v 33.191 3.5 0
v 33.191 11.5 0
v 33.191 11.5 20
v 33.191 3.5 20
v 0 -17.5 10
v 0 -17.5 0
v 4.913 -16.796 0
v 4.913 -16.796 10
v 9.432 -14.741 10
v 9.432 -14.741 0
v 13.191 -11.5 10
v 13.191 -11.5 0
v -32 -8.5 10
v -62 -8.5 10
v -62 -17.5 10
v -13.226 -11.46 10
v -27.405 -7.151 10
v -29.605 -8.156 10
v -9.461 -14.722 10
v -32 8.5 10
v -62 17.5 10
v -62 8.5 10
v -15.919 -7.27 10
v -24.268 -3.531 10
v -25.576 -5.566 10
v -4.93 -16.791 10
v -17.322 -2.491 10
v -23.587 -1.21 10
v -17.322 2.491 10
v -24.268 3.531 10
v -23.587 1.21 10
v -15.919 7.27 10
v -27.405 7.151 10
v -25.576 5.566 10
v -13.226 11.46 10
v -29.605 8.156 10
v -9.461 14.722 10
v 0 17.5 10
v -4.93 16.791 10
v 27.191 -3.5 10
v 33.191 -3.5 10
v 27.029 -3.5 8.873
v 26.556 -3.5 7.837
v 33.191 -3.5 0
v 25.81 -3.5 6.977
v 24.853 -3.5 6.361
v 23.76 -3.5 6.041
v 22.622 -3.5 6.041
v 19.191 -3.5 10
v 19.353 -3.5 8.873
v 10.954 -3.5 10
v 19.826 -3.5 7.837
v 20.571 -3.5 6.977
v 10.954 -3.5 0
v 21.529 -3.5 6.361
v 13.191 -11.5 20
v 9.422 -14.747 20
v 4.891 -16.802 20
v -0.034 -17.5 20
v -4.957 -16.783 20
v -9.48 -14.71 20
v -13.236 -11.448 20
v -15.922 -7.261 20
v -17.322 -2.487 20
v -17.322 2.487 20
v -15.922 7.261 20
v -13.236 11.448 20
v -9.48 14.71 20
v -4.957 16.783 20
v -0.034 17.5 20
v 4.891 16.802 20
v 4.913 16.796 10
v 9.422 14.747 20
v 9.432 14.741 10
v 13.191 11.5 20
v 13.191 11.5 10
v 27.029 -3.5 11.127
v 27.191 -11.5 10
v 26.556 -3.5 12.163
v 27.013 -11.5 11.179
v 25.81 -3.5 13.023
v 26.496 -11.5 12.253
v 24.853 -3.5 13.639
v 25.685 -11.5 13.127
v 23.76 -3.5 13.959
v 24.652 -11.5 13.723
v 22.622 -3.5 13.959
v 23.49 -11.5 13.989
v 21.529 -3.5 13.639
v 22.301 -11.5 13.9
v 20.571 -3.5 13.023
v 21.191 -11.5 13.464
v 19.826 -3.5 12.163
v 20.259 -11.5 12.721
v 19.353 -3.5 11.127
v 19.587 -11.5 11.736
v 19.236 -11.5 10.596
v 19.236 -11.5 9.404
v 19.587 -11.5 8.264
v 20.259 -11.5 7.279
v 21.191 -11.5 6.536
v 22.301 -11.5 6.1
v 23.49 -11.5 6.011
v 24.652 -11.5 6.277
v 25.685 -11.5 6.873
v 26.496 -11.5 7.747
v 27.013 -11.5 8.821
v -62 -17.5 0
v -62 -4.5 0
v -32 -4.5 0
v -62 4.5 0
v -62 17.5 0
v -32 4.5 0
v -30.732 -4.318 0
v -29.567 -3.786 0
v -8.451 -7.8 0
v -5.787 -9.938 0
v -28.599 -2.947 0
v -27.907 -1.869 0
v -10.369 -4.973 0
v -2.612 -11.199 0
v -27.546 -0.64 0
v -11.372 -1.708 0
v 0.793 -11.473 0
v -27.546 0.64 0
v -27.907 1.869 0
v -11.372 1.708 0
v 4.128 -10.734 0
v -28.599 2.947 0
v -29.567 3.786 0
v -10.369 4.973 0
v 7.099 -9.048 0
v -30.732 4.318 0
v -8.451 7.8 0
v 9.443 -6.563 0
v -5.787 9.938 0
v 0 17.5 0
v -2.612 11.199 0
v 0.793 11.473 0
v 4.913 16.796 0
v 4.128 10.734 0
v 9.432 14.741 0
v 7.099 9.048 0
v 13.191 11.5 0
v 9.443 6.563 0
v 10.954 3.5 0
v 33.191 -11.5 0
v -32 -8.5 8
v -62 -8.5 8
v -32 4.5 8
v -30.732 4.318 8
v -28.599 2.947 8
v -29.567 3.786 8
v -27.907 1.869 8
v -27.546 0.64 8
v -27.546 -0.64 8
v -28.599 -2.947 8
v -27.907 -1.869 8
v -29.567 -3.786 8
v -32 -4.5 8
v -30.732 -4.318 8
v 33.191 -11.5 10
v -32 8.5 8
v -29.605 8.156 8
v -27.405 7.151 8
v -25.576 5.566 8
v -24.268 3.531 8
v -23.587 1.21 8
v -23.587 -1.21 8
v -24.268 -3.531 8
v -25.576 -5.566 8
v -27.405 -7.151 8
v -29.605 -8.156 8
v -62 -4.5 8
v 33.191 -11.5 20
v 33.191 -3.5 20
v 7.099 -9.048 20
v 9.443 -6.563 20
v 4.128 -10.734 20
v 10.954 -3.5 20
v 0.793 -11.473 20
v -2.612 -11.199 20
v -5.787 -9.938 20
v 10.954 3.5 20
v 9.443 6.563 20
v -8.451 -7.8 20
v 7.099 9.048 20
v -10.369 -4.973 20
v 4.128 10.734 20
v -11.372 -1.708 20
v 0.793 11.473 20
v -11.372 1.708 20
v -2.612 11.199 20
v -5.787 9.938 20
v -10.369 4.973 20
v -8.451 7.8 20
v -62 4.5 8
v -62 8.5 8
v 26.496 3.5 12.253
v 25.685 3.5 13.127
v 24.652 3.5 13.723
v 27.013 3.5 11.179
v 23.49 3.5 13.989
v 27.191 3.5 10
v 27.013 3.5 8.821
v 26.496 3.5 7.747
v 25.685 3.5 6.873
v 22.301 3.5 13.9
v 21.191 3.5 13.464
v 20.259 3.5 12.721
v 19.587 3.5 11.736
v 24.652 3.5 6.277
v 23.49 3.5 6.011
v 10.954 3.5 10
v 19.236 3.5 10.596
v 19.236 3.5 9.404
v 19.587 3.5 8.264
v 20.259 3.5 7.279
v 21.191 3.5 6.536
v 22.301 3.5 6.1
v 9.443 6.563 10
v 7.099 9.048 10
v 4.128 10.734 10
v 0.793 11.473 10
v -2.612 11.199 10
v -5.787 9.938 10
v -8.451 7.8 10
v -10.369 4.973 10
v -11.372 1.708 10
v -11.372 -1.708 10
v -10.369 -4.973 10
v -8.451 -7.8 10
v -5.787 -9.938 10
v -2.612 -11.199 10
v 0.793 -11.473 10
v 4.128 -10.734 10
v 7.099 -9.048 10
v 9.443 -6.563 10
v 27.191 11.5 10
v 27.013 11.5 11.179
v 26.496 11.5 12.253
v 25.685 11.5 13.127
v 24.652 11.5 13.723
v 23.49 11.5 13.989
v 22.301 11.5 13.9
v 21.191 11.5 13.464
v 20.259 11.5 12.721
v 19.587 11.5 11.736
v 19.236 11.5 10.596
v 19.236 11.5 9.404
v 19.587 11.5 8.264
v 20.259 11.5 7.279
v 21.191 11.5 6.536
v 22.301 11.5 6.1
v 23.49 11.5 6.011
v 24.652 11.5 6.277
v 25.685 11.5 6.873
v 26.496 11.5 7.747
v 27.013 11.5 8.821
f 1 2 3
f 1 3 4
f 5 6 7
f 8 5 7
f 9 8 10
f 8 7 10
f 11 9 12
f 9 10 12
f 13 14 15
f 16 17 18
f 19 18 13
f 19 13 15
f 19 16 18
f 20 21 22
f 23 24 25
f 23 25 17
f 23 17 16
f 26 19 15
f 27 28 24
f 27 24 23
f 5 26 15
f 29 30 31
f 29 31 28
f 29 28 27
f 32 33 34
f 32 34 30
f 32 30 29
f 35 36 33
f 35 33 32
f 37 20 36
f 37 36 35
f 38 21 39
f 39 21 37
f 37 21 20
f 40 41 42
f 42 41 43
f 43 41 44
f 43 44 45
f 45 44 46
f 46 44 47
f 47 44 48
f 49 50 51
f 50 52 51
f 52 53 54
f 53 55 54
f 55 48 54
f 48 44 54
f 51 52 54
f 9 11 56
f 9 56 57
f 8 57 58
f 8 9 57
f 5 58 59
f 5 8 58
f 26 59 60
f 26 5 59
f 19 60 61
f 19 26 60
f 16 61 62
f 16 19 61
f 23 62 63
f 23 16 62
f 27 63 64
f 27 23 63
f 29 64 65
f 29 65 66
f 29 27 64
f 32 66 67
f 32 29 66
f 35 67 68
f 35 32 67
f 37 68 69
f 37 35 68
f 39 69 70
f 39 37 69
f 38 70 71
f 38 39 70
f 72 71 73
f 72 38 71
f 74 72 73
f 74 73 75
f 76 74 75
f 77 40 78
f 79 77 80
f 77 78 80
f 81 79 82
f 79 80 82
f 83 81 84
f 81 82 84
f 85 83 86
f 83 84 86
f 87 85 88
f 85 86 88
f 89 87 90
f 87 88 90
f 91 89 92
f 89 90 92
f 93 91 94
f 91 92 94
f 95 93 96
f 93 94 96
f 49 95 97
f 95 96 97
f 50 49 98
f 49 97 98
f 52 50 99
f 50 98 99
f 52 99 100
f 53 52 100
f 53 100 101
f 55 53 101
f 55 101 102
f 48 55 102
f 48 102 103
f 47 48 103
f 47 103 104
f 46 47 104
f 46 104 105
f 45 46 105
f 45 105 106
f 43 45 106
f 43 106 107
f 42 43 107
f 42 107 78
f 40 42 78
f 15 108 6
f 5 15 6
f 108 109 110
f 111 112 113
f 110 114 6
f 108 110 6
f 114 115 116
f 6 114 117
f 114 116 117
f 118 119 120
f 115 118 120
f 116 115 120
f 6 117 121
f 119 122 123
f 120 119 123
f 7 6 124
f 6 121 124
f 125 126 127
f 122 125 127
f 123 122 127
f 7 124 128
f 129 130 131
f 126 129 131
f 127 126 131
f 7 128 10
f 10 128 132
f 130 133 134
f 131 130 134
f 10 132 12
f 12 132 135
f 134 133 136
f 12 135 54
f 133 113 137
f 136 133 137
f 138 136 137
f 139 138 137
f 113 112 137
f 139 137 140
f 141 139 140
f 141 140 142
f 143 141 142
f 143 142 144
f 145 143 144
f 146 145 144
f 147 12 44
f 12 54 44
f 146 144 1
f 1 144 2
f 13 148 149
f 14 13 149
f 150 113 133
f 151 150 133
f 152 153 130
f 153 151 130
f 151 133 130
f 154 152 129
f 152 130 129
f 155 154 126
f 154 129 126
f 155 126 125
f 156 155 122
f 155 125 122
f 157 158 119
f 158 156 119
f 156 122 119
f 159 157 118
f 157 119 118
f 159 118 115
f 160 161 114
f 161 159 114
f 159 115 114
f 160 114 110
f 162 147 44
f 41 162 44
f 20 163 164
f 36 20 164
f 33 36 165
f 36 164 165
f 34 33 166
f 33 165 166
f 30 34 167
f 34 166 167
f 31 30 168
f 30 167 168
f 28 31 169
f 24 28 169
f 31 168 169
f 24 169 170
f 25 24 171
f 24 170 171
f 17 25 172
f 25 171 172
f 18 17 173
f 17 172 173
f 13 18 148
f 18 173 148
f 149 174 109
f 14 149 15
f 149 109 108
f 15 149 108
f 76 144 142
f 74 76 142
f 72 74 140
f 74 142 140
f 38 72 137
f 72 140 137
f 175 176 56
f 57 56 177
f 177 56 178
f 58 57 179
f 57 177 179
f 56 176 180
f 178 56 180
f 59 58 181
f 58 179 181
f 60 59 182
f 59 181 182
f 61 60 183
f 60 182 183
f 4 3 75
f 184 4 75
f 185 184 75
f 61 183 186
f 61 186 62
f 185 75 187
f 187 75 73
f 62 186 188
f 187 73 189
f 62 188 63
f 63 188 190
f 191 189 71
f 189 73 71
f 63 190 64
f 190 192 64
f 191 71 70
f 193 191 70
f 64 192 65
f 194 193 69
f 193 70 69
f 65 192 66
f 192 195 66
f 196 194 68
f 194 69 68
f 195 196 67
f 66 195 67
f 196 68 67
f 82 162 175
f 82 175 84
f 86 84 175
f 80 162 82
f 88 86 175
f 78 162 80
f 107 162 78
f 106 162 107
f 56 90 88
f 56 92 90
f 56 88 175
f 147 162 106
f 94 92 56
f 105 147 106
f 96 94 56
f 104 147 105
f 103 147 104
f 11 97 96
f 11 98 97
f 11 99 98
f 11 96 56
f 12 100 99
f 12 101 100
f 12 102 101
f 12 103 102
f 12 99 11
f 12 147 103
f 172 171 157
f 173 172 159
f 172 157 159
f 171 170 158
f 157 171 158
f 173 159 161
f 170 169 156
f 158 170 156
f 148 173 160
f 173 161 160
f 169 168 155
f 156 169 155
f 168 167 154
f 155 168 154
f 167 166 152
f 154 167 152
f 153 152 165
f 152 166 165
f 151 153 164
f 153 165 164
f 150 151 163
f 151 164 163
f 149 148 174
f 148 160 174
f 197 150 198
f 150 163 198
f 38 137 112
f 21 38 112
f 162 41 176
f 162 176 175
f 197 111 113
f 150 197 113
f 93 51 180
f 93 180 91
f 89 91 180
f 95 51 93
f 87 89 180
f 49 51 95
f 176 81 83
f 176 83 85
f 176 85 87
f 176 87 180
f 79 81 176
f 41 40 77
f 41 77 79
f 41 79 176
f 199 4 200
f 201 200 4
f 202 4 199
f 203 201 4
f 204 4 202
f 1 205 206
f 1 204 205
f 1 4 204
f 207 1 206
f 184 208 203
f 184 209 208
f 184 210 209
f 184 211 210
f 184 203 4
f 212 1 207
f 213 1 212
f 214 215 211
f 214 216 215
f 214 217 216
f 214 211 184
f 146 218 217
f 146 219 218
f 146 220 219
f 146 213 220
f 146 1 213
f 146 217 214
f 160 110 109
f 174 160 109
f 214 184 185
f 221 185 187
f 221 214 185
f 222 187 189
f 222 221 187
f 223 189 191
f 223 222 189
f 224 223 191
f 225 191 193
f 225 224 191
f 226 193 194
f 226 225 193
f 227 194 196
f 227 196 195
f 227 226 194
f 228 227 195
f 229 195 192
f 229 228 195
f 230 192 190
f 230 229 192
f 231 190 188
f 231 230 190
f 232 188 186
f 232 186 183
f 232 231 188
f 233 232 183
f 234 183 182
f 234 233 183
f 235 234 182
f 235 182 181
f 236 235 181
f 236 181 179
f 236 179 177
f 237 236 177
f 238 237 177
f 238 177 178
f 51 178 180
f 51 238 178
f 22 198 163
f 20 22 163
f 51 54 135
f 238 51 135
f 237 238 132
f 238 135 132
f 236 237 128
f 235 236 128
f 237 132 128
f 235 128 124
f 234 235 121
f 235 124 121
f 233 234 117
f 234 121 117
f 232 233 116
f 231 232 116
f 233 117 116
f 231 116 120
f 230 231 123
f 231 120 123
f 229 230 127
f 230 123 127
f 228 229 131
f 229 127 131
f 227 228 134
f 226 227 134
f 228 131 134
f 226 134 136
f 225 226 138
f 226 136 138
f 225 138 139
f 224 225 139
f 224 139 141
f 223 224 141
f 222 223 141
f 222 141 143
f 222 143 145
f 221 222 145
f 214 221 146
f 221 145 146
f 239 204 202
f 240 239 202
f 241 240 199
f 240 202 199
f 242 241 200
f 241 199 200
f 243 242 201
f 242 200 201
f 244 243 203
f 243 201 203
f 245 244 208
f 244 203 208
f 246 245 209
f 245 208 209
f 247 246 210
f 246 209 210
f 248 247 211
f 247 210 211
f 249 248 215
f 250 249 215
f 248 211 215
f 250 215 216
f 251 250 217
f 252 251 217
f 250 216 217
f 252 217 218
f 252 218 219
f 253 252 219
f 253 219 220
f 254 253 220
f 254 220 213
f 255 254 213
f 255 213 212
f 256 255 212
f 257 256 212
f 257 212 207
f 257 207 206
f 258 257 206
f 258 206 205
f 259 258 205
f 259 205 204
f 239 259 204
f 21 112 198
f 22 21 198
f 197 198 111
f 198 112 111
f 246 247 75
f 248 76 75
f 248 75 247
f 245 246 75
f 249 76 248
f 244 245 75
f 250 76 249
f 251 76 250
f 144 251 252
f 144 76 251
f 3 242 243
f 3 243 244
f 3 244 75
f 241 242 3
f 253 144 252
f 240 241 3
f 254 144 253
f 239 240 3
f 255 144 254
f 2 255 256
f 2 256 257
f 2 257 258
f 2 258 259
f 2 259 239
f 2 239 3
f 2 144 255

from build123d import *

# Parameters (mm, degrees)
BOSS_EXTRU_1_DEPTH      = 10
BOSS_EXTRU_2_DEPTH      = 10
ENL_V_START             = -2
ENL_V_MAT_EXTRU_1_DEPTH = 2
ESQUISSE4_R             = 4
ENL_V_MAT_EXTRU_2_DEPTH = 72.309185944


with BuildPart() as part:
    # Esquisse1 → Boss.-Extru.1 (new body)
    with BuildSketch(Plane.XY):
        with BuildLine():
            Line((-62, 17.5), (-62, 4.5))
            Line((-62, 4.5), (-32, 4.5))
            ThreePointArc((-32, 4.5), (-27.5, 0), (-32, -4.5))
            Line((-32, -4.5), (-62, -4.5))
            Line((-62, -4.5), (-62, -17.5))
            Line((-62, -17.5), (0, -17.5))
            ThreePointArc((0, -17.5), (7.245688373, -15.929532322), (13.190905958, -11.5))
            Line((13.190905958, -11.5), (33.190905958, -11.5))
            Line((33.190905958, -11.5), (33.190905958, -3.5))
            Line((33.190905958, -3.5), (10.95445115, -3.5))
            ThreePointArc((10.95445115, -3.5), (-11.5, 0), (10.95445115, 3.5))
            Line((10.95445115, 3.5), (33.190905958, 3.5))
            Line((33.190905958, 3.5), (33.190905958, 11.5))
            Line((33.190905958, 11.5), (13.190905958, 11.5))
            ThreePointArc((13.190905958, 11.5), (7.245688373, 15.929532322), (0, 17.5))
            Line((0, 17.5), (-62, 17.5))
        make_face()
    extrude(amount=BOSS_EXTRU_1_DEPTH)

    # Esquisse2 → Boss.-Extru.2 (add)
    with BuildSketch(Plane.XY.offset(10)):
        with BuildLine():
            Line((13.190905958, 11.5), (33.190905958, 11.5))
            Line((33.190905958, 11.5), (33.190905958, 3.5))
            Line((33.190905958, 3.5), (10.95445115, 3.5))
            ThreePointArc((10.95445115, 3.5), (-11.5, 0), (10.95445115, -3.5))
            Line((10.95445115, -3.5), (33.190905958, -3.5))
            Line((33.190905958, -3.5), (33.190905958, -11.5))
            Line((33.190905958, -11.5), (13.190905958, -11.5))
            ThreePointArc((13.190905958, -11.5), (-17.5, 0), (13.190905958, 11.5))
        make_face()
    extrude(amount=BOSS_EXTRU_2_DEPTH)

    # Esquisse3 → Enlèv. mat.-Extru.1 (cut)
    with BuildSketch(Plane.XY.offset(10).offset(ENL_V_START)):
        with BuildLine():
            Line((-32, 4.5), (-62, 4.5))
            Line((-62, 4.5), (-62, 8.5))
            Line((-62, 8.5), (-32, 8.5))
            ThreePointArc((-32, 8.5), (-23.5, 0), (-32, -8.5))
            Line((-32, -8.5), (-62, -8.5))
            Line((-62, -8.5), (-62, -4.5))
            Line((-62, -4.5), (-32, -4.5))
            ThreePointArc((-32, -4.5), (-27.5, 0), (-32, 4.5))
        make_face()
    extrude(amount=ENL_V_MAT_EXTRU_1_DEPTH, mode=Mode.SUBTRACT)

    # Esquisse4 → Enlèv. mat.-Extru.2 (cut, through all)
    with BuildSketch(Plane.XZ.offset(11.5)):
        with Locations((23.190905958, 10)):
            Circle(ESQUISSE4_R)
    extrude(amount=-ENL_V_MAT_EXTRU_2_DEPTH, mode=Mode.SUBTRACT)


solid = part.part
